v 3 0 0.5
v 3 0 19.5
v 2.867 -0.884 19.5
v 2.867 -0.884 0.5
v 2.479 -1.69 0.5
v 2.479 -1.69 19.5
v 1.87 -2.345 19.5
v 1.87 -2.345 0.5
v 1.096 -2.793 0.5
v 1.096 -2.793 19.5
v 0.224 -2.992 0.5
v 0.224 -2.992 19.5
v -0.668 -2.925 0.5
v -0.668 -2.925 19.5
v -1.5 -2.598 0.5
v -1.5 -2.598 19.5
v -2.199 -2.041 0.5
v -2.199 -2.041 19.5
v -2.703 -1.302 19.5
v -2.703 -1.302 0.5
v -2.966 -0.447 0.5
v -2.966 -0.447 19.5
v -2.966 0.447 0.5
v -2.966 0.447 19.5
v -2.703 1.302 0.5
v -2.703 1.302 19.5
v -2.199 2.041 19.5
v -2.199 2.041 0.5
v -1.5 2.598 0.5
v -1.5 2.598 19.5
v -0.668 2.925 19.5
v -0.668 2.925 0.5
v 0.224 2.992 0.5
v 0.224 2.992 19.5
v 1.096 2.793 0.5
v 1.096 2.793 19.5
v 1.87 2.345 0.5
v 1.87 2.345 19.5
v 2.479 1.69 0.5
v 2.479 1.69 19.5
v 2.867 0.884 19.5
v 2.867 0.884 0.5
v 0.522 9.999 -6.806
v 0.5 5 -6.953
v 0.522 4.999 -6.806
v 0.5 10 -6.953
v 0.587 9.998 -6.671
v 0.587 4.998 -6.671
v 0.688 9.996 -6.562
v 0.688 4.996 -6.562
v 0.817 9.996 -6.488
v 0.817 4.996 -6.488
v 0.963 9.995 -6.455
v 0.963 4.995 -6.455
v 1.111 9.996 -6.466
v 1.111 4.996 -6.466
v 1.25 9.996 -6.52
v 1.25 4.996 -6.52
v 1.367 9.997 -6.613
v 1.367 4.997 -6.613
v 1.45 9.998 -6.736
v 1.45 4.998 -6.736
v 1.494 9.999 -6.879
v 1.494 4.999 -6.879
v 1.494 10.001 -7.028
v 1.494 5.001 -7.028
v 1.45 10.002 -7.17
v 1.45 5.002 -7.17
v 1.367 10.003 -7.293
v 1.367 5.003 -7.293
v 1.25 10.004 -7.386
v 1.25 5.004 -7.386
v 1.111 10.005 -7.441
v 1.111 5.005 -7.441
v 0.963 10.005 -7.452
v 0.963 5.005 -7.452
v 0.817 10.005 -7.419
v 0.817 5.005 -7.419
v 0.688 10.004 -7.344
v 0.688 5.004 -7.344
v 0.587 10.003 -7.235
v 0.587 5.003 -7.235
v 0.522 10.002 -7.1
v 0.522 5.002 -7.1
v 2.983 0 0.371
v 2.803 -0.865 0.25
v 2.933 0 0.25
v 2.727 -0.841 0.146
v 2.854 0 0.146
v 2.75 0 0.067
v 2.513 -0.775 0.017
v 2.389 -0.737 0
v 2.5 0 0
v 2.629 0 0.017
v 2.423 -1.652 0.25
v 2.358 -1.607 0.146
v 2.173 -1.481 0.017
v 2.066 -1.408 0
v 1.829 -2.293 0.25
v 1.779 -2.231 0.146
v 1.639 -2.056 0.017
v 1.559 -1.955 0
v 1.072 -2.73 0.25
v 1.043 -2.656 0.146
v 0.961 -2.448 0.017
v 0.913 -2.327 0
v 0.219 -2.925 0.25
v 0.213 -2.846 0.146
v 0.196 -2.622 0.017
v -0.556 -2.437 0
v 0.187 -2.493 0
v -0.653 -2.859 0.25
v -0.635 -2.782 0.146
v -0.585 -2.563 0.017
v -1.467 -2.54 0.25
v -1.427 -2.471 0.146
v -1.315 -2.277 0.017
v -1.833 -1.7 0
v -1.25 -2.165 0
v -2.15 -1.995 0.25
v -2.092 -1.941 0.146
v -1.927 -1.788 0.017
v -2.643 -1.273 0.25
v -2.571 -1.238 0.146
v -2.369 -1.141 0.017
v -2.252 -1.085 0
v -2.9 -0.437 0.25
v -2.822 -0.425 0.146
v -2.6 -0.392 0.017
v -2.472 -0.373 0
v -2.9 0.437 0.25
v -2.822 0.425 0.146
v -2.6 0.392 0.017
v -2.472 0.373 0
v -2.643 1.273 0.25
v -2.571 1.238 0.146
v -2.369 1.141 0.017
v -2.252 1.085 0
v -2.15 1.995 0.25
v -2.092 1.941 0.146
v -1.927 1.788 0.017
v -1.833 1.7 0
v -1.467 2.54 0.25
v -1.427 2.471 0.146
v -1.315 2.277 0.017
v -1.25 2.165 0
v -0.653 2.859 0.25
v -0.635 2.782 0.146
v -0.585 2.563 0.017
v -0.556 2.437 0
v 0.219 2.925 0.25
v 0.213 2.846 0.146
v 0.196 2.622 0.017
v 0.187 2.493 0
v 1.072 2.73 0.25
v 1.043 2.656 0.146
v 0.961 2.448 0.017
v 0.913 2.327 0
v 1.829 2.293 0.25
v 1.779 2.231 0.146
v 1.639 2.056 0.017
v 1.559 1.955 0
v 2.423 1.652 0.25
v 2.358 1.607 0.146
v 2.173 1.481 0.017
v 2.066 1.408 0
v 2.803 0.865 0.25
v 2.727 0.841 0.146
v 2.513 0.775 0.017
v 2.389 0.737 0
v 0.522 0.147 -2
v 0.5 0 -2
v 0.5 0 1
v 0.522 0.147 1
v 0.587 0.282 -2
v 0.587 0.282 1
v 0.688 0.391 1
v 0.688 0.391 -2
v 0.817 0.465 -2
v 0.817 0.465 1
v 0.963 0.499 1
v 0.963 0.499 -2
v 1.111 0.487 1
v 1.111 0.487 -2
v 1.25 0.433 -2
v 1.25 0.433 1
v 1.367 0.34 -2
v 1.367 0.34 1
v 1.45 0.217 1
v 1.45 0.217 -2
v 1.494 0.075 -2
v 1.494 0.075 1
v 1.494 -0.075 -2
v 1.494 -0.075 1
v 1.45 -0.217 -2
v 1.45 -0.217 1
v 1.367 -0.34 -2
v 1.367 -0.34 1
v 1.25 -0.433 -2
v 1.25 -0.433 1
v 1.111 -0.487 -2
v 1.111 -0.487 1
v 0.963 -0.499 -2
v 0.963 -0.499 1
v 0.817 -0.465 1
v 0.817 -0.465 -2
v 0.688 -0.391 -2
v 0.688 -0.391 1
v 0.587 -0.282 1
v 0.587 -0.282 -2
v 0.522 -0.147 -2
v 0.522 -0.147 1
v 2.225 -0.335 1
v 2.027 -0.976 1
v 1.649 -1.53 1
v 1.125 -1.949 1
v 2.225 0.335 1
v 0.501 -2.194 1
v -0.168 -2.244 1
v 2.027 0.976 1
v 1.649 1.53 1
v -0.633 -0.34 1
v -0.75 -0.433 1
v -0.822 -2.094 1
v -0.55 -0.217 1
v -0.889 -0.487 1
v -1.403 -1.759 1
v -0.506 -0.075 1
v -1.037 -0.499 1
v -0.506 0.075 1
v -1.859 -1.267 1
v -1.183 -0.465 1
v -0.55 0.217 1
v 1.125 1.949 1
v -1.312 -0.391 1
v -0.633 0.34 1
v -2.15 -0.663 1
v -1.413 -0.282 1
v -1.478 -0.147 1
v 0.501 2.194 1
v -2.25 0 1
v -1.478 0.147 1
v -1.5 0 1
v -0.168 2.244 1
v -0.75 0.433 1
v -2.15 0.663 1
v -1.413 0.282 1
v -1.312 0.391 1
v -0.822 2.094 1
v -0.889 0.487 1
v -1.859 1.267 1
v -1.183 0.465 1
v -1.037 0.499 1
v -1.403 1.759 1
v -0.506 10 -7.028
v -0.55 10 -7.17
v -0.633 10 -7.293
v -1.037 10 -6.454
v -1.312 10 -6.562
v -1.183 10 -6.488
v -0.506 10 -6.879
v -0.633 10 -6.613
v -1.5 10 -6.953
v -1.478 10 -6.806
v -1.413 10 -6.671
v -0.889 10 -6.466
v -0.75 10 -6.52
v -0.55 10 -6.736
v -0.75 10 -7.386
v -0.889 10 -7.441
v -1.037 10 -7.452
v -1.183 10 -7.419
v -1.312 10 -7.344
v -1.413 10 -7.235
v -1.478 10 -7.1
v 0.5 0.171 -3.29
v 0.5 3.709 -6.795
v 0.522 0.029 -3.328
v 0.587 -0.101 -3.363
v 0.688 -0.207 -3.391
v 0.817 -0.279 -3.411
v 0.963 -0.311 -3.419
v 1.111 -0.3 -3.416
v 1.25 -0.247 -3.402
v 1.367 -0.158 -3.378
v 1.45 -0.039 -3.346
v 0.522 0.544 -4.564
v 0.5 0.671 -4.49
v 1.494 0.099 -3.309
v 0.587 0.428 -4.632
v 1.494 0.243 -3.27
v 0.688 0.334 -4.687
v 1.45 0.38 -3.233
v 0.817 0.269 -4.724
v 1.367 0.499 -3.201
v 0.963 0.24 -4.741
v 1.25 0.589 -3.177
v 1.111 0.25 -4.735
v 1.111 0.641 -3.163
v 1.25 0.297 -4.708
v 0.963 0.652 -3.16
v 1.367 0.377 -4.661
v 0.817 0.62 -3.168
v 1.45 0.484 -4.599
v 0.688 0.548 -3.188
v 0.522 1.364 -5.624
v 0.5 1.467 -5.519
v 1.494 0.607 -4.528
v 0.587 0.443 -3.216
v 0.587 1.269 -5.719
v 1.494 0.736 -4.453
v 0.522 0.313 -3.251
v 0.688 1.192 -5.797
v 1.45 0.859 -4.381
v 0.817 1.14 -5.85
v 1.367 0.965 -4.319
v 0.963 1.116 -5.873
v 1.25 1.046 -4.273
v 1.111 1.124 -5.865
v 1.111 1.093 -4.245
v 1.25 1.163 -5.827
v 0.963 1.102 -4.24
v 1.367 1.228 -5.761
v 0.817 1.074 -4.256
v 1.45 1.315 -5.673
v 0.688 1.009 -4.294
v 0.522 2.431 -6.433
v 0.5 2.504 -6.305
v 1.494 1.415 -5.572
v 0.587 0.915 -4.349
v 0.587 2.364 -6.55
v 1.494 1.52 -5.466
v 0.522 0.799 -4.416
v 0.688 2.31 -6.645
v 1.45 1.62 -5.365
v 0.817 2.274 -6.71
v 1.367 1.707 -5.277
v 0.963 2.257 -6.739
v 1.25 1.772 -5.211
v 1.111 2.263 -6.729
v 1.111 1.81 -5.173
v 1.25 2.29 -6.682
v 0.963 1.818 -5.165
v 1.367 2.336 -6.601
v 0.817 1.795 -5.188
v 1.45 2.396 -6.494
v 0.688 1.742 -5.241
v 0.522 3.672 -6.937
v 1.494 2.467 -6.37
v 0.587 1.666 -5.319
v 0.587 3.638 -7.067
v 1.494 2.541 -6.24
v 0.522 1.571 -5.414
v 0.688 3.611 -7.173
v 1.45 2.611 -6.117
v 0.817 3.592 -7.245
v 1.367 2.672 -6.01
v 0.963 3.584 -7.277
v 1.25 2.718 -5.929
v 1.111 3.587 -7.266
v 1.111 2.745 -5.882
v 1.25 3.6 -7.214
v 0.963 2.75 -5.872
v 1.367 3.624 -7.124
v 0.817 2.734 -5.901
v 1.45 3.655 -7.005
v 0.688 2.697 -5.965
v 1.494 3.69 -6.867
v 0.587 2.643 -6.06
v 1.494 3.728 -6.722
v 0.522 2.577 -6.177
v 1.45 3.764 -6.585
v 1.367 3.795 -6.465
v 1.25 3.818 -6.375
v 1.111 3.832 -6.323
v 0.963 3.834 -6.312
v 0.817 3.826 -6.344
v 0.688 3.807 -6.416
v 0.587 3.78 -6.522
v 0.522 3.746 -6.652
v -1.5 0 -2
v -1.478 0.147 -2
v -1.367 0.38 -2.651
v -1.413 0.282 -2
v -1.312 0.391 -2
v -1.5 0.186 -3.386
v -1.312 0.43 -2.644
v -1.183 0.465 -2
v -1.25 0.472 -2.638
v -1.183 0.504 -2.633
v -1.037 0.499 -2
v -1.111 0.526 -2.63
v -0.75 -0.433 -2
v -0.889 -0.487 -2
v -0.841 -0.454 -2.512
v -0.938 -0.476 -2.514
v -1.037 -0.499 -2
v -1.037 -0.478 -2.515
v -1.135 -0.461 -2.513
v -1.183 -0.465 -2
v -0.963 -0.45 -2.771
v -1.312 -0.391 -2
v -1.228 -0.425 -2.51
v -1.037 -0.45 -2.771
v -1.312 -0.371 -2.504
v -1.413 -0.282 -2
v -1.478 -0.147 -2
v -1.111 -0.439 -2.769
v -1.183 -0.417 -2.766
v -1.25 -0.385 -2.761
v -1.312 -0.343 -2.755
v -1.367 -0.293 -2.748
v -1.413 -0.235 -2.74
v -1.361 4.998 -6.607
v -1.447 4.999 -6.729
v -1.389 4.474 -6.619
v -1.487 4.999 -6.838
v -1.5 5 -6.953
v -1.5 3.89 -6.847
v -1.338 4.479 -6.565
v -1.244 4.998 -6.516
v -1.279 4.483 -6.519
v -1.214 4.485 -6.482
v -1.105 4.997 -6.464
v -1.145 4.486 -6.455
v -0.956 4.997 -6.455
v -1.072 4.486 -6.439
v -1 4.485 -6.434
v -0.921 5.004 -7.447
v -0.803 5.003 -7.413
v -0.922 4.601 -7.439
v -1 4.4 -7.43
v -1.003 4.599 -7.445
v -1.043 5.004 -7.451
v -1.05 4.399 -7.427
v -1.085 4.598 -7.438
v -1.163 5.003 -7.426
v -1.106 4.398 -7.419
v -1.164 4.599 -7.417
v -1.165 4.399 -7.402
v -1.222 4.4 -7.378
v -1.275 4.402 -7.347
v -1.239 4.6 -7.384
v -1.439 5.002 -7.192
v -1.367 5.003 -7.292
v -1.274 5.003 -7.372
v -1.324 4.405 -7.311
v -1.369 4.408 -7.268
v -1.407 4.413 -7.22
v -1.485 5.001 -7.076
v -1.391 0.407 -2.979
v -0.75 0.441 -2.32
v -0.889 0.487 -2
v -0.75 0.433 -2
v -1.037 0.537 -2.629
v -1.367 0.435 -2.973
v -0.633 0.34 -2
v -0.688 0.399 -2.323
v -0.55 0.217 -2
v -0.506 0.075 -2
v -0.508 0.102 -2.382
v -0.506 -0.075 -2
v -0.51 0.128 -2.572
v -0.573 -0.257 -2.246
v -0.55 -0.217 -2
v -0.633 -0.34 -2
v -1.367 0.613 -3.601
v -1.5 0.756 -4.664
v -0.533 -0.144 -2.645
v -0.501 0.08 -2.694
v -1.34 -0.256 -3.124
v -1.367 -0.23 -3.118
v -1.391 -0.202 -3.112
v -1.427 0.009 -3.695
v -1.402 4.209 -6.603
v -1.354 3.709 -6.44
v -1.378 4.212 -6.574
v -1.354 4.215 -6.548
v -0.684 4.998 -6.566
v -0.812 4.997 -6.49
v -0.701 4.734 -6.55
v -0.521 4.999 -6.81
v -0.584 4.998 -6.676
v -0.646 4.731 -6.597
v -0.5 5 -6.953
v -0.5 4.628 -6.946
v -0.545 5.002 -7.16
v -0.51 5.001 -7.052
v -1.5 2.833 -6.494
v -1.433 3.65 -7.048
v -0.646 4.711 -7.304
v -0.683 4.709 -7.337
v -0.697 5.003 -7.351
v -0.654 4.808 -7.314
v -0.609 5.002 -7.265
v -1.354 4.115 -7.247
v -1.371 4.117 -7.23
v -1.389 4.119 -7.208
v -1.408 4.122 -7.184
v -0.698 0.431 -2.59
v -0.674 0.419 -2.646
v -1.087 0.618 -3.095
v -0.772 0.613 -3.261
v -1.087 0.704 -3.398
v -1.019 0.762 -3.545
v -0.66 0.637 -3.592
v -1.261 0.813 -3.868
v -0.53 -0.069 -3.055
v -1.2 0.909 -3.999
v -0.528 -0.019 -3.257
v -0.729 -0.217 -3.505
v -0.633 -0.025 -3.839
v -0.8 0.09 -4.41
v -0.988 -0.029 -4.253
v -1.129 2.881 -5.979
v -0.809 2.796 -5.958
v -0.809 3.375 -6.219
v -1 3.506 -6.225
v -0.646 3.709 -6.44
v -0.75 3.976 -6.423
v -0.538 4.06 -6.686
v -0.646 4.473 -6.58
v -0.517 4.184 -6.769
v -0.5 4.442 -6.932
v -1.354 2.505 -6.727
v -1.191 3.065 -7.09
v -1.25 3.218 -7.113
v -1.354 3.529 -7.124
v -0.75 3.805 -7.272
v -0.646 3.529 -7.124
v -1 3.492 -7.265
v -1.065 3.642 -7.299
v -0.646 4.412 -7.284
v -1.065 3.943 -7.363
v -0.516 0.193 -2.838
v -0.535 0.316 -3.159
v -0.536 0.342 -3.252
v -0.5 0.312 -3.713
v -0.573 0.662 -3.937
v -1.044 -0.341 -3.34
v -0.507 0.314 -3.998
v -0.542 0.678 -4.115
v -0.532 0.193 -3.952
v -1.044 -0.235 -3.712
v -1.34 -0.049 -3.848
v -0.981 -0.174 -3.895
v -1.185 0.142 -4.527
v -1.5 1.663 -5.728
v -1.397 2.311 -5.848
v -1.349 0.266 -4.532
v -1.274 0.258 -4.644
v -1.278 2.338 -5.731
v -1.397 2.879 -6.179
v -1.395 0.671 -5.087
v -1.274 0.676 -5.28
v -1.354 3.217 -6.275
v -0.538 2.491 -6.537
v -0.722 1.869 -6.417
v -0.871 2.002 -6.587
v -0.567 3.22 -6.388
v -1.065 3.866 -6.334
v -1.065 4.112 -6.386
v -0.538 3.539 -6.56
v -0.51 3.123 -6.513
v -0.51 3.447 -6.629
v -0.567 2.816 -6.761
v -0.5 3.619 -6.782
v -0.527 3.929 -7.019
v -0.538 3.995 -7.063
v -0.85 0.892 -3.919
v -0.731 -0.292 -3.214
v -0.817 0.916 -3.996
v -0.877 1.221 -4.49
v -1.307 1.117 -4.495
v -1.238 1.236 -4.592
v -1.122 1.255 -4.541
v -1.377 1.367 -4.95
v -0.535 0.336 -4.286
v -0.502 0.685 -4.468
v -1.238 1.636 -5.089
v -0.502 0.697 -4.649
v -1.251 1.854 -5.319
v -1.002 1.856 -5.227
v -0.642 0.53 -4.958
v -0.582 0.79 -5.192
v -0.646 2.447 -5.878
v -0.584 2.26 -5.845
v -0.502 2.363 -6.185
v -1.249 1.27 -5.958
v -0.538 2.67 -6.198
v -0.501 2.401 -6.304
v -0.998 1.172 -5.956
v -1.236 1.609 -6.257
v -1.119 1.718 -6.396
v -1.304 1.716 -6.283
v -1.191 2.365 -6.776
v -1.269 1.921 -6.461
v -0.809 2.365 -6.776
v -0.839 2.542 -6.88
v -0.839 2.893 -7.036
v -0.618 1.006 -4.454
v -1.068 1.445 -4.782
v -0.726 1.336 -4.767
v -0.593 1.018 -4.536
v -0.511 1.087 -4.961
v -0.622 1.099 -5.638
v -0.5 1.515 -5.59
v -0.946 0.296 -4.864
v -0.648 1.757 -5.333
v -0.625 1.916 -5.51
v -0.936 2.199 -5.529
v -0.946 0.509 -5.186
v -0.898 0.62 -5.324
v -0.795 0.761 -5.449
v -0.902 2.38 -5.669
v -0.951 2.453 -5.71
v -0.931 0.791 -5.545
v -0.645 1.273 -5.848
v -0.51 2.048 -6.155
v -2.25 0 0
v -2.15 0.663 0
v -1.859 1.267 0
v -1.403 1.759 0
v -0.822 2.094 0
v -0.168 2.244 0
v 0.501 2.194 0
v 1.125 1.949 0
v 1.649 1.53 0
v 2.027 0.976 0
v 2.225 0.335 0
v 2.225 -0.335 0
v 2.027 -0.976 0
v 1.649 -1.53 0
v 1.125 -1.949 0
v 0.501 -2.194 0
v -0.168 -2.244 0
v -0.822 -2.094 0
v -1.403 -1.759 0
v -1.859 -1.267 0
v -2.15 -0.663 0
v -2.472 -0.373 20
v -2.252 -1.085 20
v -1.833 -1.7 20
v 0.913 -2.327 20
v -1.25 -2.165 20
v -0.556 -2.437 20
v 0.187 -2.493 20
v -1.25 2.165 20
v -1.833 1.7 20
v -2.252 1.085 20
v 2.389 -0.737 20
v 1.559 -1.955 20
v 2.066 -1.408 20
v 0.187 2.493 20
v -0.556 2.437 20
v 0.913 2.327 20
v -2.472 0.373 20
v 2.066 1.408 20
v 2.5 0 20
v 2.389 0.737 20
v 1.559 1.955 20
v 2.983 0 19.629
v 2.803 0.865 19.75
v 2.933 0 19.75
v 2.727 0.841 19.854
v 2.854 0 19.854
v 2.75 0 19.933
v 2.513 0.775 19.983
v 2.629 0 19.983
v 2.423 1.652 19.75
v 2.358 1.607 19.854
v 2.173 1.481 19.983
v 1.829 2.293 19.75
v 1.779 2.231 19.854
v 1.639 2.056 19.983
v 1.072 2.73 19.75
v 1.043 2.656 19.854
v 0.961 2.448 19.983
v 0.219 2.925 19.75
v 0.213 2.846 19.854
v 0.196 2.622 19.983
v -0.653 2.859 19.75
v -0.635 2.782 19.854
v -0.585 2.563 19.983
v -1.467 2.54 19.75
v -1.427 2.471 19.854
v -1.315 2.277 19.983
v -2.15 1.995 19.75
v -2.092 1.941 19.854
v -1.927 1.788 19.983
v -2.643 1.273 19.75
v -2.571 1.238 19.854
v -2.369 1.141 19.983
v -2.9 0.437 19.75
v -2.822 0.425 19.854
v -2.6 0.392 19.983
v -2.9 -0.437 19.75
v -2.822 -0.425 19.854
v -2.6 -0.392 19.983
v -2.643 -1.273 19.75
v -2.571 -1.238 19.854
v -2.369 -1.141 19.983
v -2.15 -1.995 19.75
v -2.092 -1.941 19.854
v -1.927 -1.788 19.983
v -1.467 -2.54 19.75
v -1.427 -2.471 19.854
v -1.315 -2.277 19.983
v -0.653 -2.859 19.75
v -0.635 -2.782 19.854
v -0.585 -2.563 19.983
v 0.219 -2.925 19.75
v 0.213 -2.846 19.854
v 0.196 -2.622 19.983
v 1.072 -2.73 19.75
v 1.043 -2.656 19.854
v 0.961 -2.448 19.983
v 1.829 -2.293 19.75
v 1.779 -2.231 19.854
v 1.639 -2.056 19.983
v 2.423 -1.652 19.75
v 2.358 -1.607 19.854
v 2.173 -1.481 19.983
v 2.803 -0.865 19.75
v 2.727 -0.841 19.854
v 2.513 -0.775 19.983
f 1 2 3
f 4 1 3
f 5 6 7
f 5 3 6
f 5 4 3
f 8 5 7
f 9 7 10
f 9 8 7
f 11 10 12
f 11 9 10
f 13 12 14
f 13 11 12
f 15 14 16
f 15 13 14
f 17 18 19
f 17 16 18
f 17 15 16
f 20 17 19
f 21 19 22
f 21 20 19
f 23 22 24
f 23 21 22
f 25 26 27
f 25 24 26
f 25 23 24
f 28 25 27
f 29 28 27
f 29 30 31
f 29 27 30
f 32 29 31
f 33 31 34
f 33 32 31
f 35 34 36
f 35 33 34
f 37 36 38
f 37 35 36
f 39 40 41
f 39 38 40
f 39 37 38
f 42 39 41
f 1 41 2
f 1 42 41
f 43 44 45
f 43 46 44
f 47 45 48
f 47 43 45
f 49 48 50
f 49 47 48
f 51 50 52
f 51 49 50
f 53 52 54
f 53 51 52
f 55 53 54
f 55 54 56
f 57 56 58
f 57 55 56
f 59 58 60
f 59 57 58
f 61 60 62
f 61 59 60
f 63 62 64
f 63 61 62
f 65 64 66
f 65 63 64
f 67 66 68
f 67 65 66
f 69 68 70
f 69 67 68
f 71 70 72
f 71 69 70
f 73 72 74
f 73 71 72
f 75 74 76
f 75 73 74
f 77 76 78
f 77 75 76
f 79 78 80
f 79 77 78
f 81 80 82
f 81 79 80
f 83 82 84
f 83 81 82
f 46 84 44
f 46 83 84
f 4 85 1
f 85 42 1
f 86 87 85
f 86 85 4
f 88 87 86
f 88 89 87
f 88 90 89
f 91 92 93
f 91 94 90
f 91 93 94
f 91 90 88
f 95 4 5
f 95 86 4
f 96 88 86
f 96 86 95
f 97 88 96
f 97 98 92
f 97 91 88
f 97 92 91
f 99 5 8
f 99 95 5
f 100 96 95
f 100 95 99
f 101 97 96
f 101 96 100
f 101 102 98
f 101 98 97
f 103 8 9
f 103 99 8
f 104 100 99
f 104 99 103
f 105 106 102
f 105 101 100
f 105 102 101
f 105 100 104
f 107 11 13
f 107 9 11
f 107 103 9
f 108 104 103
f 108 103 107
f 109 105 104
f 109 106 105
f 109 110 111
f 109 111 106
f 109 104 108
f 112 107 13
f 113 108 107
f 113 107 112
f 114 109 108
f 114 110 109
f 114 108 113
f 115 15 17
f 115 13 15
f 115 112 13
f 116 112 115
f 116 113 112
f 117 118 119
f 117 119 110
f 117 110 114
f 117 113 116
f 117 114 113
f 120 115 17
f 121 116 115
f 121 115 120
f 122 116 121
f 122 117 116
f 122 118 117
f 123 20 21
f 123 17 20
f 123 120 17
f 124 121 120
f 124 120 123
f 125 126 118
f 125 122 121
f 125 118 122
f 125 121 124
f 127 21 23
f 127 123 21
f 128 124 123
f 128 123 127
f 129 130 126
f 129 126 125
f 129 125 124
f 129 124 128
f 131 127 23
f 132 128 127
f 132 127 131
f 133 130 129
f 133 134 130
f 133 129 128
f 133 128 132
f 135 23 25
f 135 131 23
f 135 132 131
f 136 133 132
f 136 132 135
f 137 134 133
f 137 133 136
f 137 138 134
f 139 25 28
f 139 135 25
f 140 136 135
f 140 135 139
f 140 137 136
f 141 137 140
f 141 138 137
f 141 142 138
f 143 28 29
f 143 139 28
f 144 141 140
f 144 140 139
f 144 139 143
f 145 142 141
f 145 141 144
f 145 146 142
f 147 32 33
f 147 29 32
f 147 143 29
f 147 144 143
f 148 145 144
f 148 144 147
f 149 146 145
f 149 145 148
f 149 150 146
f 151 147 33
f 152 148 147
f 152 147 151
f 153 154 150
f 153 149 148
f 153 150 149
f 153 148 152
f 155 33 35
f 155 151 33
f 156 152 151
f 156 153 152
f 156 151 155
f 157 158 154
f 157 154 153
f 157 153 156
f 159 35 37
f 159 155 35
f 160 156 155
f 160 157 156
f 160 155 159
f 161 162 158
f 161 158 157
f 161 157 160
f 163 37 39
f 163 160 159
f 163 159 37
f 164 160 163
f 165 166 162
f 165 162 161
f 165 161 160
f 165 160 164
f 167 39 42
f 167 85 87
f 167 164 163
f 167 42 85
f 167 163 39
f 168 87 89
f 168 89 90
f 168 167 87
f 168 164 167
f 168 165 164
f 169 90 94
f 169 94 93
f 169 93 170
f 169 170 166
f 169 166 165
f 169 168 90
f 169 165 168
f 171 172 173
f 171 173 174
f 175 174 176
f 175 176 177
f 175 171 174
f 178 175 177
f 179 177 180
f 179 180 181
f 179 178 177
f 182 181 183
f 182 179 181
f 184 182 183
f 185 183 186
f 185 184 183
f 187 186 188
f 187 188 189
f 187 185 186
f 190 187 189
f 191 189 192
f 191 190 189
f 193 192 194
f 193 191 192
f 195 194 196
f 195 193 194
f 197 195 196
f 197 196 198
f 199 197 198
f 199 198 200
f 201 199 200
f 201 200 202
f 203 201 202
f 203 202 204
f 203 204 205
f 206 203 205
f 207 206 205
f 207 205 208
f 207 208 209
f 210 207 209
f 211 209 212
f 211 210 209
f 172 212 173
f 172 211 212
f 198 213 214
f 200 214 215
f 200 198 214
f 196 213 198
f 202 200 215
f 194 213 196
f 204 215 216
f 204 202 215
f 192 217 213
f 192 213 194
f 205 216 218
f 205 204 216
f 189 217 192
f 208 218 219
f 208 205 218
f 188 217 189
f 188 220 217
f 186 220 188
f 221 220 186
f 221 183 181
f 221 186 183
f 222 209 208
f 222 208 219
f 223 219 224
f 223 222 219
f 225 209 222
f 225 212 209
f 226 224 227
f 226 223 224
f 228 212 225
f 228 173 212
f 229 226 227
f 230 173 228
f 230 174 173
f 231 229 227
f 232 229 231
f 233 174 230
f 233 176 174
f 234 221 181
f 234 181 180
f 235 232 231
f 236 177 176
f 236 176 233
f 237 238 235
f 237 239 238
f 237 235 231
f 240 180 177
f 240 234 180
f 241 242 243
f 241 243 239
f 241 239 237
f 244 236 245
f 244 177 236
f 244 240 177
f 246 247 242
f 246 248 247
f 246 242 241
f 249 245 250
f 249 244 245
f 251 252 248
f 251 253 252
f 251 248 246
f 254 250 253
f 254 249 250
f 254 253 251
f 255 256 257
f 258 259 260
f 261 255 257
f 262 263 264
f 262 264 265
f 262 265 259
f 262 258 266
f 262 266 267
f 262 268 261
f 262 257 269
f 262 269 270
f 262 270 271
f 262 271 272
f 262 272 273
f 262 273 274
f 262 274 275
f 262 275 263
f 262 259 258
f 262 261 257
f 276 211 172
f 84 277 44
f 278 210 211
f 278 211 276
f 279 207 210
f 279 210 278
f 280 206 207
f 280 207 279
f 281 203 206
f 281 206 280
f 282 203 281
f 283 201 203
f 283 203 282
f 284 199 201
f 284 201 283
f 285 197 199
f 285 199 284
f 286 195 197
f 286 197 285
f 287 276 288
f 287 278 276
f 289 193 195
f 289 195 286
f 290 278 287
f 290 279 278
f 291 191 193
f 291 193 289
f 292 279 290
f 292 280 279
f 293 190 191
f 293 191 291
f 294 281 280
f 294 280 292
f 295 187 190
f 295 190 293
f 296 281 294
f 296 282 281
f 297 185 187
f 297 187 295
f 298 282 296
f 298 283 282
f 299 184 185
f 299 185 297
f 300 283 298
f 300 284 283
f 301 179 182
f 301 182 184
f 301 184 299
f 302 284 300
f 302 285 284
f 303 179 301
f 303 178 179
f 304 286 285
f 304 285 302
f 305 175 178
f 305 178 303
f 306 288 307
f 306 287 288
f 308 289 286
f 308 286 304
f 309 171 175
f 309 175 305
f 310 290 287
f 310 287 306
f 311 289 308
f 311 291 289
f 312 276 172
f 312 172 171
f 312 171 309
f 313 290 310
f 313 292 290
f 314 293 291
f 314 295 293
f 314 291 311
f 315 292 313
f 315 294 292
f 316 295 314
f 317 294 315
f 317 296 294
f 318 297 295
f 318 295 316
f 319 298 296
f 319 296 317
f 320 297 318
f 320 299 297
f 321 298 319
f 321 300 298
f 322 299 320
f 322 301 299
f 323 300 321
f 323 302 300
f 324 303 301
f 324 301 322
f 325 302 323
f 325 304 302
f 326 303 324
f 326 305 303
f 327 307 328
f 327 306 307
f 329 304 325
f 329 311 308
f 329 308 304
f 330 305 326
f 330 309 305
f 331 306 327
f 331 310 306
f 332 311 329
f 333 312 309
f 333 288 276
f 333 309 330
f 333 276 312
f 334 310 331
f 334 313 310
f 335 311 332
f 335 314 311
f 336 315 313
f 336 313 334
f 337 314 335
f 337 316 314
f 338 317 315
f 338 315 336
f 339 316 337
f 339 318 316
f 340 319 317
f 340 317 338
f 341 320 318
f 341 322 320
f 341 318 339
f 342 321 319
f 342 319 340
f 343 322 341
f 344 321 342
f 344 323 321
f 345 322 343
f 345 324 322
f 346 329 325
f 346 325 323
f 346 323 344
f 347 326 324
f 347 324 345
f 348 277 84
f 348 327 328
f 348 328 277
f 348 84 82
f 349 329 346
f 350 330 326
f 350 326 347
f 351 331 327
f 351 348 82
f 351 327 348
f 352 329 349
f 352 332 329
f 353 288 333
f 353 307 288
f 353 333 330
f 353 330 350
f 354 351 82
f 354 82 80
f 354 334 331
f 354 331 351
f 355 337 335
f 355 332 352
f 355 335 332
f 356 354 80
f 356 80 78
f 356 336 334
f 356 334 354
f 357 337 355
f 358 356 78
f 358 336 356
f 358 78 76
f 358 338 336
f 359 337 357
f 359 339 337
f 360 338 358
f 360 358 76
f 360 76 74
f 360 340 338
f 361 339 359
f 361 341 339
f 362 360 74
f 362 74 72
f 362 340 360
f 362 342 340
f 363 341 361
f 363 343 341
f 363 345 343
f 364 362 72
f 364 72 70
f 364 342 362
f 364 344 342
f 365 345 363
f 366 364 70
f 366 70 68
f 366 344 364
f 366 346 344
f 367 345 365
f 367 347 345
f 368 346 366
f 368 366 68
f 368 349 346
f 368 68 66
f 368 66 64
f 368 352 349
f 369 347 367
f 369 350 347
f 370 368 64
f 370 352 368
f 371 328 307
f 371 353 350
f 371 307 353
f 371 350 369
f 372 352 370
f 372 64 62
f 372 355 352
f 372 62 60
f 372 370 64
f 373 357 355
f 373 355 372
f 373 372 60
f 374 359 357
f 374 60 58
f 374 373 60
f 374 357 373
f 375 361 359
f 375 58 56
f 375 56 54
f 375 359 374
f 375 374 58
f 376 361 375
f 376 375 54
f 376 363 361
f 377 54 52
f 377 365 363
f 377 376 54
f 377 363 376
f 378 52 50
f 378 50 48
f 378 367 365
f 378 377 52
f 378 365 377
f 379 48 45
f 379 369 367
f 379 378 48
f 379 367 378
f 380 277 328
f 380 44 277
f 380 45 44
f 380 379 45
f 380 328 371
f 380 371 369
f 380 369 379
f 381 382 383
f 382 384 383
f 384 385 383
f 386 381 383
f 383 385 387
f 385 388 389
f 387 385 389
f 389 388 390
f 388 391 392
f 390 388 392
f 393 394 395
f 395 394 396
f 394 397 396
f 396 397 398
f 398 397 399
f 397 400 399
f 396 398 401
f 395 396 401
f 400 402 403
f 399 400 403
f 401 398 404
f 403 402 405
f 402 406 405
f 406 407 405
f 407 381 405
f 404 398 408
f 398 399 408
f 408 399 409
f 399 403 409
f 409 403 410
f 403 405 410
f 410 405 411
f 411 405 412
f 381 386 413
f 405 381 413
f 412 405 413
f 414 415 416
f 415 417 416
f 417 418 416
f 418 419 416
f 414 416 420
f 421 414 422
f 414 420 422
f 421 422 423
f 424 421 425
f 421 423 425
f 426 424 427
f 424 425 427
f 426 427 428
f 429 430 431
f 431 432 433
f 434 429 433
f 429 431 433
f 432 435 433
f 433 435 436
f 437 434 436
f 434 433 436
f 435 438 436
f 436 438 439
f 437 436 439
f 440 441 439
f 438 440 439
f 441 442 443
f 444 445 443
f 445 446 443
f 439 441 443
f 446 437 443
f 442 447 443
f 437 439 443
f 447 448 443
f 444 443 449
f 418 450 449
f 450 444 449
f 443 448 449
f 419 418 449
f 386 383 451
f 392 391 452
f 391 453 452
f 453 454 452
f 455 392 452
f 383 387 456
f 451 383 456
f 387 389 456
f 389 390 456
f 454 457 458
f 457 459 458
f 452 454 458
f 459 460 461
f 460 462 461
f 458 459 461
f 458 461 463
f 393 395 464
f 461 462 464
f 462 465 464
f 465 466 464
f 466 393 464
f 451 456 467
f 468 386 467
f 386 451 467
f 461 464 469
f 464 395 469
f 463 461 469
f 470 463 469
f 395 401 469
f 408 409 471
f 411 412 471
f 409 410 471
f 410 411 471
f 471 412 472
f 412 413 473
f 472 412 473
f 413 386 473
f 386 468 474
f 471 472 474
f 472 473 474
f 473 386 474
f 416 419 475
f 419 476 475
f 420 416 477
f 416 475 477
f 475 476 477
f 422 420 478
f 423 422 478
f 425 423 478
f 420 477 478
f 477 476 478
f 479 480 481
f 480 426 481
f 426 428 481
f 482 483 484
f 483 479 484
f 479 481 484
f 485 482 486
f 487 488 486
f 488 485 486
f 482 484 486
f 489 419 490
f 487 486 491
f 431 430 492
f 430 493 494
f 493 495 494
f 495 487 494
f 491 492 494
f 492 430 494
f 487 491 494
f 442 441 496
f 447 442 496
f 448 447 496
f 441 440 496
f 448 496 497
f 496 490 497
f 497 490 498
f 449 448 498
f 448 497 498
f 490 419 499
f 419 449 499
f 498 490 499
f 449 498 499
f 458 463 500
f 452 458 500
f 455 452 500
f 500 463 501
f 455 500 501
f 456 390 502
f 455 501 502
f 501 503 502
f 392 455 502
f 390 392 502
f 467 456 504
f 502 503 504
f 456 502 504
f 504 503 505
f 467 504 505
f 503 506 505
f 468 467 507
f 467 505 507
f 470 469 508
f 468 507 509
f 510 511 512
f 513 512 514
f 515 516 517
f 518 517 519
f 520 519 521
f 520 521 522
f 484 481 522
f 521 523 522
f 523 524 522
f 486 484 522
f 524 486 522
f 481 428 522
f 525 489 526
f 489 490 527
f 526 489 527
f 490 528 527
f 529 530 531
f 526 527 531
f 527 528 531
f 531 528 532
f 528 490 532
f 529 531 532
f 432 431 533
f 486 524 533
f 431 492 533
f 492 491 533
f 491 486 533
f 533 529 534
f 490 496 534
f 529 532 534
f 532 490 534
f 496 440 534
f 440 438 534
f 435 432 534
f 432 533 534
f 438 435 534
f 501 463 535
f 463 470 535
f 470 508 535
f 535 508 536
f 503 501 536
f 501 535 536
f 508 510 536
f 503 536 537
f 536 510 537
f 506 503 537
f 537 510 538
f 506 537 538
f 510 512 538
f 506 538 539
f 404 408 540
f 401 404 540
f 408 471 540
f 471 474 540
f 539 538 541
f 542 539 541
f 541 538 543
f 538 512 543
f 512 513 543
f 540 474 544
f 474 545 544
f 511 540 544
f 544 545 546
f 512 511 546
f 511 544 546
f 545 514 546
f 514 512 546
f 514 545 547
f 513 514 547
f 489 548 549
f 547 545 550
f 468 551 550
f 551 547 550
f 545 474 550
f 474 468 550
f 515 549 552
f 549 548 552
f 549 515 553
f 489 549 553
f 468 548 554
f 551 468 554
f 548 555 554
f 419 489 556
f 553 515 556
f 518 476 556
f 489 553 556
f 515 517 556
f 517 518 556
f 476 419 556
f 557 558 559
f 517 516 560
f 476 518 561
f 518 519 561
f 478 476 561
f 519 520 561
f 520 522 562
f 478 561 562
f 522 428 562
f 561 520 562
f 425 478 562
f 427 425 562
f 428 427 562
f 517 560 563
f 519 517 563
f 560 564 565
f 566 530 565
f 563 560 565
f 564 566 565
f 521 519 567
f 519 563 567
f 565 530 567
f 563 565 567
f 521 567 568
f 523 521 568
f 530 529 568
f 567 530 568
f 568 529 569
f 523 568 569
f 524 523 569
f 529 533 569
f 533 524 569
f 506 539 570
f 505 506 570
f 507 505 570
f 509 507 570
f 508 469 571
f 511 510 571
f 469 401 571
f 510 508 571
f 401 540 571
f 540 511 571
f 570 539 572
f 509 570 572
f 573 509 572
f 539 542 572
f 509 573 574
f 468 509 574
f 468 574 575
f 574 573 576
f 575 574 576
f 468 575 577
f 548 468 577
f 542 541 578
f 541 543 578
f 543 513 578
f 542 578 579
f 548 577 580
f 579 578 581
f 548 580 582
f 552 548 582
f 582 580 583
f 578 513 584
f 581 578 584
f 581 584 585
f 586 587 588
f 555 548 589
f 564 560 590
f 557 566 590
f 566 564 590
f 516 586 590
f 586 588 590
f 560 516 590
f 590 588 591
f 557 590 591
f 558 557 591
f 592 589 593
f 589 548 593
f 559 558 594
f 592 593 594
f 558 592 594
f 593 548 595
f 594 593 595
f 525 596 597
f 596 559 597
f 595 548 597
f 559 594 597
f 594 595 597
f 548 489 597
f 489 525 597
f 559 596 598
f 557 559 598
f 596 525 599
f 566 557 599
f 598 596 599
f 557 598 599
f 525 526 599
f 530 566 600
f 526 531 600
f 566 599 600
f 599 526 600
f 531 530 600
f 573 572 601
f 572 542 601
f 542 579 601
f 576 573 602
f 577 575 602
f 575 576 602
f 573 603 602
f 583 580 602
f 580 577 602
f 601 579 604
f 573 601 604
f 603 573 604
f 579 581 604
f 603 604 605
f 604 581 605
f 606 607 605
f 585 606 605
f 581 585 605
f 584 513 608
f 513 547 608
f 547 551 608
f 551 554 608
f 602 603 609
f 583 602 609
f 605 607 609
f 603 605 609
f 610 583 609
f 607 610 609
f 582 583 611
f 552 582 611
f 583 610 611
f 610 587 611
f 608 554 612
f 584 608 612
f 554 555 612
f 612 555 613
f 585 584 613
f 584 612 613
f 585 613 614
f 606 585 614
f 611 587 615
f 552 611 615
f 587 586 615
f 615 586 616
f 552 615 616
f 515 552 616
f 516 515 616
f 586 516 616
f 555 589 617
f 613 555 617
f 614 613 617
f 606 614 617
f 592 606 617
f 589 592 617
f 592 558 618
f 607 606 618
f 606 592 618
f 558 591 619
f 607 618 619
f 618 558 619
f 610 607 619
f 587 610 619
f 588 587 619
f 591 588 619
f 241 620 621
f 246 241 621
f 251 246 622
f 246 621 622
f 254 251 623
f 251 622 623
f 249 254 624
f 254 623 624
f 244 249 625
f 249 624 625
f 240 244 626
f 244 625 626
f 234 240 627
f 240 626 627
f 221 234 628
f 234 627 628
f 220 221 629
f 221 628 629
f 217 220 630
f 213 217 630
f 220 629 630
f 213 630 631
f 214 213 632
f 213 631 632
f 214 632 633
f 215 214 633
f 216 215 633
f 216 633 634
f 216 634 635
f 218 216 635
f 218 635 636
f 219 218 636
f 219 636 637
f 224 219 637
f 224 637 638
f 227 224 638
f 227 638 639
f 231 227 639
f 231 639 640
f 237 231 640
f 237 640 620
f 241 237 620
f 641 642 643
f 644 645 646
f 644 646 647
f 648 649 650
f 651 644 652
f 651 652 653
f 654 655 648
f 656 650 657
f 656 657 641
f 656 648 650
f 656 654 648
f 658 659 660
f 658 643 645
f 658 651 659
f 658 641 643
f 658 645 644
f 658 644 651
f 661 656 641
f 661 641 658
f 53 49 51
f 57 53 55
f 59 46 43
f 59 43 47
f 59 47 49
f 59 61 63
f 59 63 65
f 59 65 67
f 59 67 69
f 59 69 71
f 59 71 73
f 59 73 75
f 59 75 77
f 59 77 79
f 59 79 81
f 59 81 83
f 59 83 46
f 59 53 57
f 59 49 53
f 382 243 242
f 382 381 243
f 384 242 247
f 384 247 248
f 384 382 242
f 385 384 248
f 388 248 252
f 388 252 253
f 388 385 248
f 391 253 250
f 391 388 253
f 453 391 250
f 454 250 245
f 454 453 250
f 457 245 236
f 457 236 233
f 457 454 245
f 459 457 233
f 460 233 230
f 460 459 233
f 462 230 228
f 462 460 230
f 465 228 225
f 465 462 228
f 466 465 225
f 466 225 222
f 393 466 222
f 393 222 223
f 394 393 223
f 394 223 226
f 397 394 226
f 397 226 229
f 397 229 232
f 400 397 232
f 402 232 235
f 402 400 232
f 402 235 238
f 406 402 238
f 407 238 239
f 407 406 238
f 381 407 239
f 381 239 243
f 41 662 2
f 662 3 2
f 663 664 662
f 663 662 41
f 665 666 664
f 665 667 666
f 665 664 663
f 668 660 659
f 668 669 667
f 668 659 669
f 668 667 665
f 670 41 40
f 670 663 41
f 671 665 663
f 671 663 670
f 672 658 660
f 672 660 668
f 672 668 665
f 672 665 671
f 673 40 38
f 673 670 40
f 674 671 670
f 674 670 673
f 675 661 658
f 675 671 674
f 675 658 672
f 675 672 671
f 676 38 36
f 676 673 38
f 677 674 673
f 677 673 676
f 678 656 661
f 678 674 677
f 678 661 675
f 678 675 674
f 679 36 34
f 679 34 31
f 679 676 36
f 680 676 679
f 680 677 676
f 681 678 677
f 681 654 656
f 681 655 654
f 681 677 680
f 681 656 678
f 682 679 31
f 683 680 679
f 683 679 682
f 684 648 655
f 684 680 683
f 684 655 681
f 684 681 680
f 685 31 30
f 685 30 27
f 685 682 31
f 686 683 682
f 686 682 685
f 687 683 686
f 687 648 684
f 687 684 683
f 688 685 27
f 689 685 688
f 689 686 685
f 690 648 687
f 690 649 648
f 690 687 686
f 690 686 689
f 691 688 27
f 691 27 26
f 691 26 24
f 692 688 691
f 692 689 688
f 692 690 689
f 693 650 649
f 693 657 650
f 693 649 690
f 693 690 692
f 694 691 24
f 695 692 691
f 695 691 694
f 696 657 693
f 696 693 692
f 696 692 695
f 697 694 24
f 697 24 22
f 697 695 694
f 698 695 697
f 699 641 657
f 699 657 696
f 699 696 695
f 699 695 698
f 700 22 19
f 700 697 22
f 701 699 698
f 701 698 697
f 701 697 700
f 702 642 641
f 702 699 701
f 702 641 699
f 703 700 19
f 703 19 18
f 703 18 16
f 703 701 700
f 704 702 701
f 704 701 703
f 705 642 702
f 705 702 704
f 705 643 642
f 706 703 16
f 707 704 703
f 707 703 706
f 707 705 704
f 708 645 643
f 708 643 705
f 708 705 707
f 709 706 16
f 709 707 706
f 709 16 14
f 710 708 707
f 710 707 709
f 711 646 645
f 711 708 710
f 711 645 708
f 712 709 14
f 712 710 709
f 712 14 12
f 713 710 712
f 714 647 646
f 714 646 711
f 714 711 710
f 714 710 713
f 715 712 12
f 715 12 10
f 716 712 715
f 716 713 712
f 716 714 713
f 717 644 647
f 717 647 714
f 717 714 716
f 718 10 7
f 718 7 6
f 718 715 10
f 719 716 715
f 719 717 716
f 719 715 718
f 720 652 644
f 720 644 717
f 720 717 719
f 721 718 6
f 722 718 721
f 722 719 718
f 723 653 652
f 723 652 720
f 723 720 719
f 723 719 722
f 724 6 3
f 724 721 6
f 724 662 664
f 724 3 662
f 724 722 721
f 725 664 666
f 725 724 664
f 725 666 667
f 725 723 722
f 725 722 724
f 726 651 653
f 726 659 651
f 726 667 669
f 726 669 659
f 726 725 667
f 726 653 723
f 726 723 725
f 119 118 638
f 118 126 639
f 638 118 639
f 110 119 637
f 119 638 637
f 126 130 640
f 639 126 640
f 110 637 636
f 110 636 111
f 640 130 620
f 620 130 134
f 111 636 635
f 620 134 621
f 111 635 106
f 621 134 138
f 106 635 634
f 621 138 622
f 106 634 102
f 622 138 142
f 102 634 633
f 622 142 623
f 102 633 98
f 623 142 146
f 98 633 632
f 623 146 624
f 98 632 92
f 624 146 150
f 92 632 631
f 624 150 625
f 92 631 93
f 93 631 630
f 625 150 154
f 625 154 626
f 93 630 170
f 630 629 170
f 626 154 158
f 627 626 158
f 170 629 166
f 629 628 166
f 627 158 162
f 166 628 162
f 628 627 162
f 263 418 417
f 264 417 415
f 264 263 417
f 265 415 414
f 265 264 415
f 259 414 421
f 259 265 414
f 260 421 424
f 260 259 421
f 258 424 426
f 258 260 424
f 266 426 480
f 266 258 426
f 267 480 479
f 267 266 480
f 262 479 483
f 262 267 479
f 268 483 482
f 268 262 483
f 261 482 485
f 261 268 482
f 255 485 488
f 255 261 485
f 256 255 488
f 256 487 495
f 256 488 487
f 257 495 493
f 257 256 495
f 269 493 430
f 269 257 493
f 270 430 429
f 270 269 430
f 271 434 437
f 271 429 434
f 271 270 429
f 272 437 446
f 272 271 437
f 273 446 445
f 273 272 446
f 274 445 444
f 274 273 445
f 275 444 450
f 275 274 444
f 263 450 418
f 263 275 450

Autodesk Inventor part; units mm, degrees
ref_plane "XZ Plane" through (0, 0, 0) normal (0, 1, 0) x (-1, 0, 0)
sketch "Эскиз1" plane through (0, 0, 0) normal (0, 0, 1) x (1, 0, 0)
  circle A0 centre (0, 0) radius 3
  dimension "d0" = 6
extrude "Выдавливание1" add sketch "Эскиз1" along normal blind 20
fillet "Сопряжение1" radius 0.5 2 edges at (-3, 0, 20) (-3, 0, 0)
sketch "Эскиз2" plane through (0, 0, 0) normal (0, 0, -1) x (-1, 0, 0)
  circle A0 centre (0, 0) radius 2.25
  circle A1 centre (1, 0) radius 0.5
  circle A2 centre (-1, 0) radius 0.5
  line L0 (0, 2.25) -> (0, -2.5)
  circle A3 centre (0, 0) radius 2.5 projected
  dimension "d4" = 4.5
  dimension "d5" = 1
  dimension "d6" = 1
  dimension "d7" = 2
extrude "Выдавливание2" cut sketch "Эскиз2" against normal blind 1 contours A0 L0 | L0 A0
ref_plane "РабПлоскость1" through (1, 0, 0) normal (1, 0, 0) x (0, 1, 0)
sketch "Эскиз3" plane through (1, 0, 0) normal (1, 0, 0) x (0, 1, 0)
  line L0 (0, 0) -> (0, -2)
  arc A0 (0, -2) -> (5.0002, -6.9531) centre (4.9534, -2) ccw
  line L1 (5.0002, -6.9531) -> (10.0002, -6.9531)
  dimension "d11" = 2
  dimension "d12" = 5
sketch "Эскиз4" plane through (1, 0, 0) normal (0, 0, -1) x (-1, 0, 0)
  circle A0 centre (0, 0) radius 0.5
  circle A1 centre (2, 0) radius 0.5 projected
  circle A2 centre (2, 0) radius 0.5
  point P0 (1, 0)
sweep "Сдвиг1" add profiles "Эскиз4" path "Эскиз3" contours A0
ref_plane "РабПлоскость2" through (-1, 0, 0) normal (1, 0, 0) x (0, 1, 0)
sketch "Эскиз5" plane through (-1, 0, 0) normal (1, 0, 0) x (0, 1, 0)
  line L0 (0, 0) -> (0, -2)
  line L1 (-0.5, -2) -> (0.5, -2) projected
  line L2 (5.005, -7.4531) -> (4.9955, -6.4532) projected
  arc A0 (0, -2) -> (5.0002, -6.9531) centre (4.9076, -2.0462) ccw
  line L3 (5.0002, -6.9531) -> (10.0002, -6.9531)
  line L4 (10.0002, -7.4531) -> (10.0002, -6.4531) projected
sweep "Сдвиг2" add profiles "Эскиз4" path "Эскиз5" path curves L0 A0 L3 contours A1
properties part number "heater-cartrig" material "Messing, weicher Gelbton"
